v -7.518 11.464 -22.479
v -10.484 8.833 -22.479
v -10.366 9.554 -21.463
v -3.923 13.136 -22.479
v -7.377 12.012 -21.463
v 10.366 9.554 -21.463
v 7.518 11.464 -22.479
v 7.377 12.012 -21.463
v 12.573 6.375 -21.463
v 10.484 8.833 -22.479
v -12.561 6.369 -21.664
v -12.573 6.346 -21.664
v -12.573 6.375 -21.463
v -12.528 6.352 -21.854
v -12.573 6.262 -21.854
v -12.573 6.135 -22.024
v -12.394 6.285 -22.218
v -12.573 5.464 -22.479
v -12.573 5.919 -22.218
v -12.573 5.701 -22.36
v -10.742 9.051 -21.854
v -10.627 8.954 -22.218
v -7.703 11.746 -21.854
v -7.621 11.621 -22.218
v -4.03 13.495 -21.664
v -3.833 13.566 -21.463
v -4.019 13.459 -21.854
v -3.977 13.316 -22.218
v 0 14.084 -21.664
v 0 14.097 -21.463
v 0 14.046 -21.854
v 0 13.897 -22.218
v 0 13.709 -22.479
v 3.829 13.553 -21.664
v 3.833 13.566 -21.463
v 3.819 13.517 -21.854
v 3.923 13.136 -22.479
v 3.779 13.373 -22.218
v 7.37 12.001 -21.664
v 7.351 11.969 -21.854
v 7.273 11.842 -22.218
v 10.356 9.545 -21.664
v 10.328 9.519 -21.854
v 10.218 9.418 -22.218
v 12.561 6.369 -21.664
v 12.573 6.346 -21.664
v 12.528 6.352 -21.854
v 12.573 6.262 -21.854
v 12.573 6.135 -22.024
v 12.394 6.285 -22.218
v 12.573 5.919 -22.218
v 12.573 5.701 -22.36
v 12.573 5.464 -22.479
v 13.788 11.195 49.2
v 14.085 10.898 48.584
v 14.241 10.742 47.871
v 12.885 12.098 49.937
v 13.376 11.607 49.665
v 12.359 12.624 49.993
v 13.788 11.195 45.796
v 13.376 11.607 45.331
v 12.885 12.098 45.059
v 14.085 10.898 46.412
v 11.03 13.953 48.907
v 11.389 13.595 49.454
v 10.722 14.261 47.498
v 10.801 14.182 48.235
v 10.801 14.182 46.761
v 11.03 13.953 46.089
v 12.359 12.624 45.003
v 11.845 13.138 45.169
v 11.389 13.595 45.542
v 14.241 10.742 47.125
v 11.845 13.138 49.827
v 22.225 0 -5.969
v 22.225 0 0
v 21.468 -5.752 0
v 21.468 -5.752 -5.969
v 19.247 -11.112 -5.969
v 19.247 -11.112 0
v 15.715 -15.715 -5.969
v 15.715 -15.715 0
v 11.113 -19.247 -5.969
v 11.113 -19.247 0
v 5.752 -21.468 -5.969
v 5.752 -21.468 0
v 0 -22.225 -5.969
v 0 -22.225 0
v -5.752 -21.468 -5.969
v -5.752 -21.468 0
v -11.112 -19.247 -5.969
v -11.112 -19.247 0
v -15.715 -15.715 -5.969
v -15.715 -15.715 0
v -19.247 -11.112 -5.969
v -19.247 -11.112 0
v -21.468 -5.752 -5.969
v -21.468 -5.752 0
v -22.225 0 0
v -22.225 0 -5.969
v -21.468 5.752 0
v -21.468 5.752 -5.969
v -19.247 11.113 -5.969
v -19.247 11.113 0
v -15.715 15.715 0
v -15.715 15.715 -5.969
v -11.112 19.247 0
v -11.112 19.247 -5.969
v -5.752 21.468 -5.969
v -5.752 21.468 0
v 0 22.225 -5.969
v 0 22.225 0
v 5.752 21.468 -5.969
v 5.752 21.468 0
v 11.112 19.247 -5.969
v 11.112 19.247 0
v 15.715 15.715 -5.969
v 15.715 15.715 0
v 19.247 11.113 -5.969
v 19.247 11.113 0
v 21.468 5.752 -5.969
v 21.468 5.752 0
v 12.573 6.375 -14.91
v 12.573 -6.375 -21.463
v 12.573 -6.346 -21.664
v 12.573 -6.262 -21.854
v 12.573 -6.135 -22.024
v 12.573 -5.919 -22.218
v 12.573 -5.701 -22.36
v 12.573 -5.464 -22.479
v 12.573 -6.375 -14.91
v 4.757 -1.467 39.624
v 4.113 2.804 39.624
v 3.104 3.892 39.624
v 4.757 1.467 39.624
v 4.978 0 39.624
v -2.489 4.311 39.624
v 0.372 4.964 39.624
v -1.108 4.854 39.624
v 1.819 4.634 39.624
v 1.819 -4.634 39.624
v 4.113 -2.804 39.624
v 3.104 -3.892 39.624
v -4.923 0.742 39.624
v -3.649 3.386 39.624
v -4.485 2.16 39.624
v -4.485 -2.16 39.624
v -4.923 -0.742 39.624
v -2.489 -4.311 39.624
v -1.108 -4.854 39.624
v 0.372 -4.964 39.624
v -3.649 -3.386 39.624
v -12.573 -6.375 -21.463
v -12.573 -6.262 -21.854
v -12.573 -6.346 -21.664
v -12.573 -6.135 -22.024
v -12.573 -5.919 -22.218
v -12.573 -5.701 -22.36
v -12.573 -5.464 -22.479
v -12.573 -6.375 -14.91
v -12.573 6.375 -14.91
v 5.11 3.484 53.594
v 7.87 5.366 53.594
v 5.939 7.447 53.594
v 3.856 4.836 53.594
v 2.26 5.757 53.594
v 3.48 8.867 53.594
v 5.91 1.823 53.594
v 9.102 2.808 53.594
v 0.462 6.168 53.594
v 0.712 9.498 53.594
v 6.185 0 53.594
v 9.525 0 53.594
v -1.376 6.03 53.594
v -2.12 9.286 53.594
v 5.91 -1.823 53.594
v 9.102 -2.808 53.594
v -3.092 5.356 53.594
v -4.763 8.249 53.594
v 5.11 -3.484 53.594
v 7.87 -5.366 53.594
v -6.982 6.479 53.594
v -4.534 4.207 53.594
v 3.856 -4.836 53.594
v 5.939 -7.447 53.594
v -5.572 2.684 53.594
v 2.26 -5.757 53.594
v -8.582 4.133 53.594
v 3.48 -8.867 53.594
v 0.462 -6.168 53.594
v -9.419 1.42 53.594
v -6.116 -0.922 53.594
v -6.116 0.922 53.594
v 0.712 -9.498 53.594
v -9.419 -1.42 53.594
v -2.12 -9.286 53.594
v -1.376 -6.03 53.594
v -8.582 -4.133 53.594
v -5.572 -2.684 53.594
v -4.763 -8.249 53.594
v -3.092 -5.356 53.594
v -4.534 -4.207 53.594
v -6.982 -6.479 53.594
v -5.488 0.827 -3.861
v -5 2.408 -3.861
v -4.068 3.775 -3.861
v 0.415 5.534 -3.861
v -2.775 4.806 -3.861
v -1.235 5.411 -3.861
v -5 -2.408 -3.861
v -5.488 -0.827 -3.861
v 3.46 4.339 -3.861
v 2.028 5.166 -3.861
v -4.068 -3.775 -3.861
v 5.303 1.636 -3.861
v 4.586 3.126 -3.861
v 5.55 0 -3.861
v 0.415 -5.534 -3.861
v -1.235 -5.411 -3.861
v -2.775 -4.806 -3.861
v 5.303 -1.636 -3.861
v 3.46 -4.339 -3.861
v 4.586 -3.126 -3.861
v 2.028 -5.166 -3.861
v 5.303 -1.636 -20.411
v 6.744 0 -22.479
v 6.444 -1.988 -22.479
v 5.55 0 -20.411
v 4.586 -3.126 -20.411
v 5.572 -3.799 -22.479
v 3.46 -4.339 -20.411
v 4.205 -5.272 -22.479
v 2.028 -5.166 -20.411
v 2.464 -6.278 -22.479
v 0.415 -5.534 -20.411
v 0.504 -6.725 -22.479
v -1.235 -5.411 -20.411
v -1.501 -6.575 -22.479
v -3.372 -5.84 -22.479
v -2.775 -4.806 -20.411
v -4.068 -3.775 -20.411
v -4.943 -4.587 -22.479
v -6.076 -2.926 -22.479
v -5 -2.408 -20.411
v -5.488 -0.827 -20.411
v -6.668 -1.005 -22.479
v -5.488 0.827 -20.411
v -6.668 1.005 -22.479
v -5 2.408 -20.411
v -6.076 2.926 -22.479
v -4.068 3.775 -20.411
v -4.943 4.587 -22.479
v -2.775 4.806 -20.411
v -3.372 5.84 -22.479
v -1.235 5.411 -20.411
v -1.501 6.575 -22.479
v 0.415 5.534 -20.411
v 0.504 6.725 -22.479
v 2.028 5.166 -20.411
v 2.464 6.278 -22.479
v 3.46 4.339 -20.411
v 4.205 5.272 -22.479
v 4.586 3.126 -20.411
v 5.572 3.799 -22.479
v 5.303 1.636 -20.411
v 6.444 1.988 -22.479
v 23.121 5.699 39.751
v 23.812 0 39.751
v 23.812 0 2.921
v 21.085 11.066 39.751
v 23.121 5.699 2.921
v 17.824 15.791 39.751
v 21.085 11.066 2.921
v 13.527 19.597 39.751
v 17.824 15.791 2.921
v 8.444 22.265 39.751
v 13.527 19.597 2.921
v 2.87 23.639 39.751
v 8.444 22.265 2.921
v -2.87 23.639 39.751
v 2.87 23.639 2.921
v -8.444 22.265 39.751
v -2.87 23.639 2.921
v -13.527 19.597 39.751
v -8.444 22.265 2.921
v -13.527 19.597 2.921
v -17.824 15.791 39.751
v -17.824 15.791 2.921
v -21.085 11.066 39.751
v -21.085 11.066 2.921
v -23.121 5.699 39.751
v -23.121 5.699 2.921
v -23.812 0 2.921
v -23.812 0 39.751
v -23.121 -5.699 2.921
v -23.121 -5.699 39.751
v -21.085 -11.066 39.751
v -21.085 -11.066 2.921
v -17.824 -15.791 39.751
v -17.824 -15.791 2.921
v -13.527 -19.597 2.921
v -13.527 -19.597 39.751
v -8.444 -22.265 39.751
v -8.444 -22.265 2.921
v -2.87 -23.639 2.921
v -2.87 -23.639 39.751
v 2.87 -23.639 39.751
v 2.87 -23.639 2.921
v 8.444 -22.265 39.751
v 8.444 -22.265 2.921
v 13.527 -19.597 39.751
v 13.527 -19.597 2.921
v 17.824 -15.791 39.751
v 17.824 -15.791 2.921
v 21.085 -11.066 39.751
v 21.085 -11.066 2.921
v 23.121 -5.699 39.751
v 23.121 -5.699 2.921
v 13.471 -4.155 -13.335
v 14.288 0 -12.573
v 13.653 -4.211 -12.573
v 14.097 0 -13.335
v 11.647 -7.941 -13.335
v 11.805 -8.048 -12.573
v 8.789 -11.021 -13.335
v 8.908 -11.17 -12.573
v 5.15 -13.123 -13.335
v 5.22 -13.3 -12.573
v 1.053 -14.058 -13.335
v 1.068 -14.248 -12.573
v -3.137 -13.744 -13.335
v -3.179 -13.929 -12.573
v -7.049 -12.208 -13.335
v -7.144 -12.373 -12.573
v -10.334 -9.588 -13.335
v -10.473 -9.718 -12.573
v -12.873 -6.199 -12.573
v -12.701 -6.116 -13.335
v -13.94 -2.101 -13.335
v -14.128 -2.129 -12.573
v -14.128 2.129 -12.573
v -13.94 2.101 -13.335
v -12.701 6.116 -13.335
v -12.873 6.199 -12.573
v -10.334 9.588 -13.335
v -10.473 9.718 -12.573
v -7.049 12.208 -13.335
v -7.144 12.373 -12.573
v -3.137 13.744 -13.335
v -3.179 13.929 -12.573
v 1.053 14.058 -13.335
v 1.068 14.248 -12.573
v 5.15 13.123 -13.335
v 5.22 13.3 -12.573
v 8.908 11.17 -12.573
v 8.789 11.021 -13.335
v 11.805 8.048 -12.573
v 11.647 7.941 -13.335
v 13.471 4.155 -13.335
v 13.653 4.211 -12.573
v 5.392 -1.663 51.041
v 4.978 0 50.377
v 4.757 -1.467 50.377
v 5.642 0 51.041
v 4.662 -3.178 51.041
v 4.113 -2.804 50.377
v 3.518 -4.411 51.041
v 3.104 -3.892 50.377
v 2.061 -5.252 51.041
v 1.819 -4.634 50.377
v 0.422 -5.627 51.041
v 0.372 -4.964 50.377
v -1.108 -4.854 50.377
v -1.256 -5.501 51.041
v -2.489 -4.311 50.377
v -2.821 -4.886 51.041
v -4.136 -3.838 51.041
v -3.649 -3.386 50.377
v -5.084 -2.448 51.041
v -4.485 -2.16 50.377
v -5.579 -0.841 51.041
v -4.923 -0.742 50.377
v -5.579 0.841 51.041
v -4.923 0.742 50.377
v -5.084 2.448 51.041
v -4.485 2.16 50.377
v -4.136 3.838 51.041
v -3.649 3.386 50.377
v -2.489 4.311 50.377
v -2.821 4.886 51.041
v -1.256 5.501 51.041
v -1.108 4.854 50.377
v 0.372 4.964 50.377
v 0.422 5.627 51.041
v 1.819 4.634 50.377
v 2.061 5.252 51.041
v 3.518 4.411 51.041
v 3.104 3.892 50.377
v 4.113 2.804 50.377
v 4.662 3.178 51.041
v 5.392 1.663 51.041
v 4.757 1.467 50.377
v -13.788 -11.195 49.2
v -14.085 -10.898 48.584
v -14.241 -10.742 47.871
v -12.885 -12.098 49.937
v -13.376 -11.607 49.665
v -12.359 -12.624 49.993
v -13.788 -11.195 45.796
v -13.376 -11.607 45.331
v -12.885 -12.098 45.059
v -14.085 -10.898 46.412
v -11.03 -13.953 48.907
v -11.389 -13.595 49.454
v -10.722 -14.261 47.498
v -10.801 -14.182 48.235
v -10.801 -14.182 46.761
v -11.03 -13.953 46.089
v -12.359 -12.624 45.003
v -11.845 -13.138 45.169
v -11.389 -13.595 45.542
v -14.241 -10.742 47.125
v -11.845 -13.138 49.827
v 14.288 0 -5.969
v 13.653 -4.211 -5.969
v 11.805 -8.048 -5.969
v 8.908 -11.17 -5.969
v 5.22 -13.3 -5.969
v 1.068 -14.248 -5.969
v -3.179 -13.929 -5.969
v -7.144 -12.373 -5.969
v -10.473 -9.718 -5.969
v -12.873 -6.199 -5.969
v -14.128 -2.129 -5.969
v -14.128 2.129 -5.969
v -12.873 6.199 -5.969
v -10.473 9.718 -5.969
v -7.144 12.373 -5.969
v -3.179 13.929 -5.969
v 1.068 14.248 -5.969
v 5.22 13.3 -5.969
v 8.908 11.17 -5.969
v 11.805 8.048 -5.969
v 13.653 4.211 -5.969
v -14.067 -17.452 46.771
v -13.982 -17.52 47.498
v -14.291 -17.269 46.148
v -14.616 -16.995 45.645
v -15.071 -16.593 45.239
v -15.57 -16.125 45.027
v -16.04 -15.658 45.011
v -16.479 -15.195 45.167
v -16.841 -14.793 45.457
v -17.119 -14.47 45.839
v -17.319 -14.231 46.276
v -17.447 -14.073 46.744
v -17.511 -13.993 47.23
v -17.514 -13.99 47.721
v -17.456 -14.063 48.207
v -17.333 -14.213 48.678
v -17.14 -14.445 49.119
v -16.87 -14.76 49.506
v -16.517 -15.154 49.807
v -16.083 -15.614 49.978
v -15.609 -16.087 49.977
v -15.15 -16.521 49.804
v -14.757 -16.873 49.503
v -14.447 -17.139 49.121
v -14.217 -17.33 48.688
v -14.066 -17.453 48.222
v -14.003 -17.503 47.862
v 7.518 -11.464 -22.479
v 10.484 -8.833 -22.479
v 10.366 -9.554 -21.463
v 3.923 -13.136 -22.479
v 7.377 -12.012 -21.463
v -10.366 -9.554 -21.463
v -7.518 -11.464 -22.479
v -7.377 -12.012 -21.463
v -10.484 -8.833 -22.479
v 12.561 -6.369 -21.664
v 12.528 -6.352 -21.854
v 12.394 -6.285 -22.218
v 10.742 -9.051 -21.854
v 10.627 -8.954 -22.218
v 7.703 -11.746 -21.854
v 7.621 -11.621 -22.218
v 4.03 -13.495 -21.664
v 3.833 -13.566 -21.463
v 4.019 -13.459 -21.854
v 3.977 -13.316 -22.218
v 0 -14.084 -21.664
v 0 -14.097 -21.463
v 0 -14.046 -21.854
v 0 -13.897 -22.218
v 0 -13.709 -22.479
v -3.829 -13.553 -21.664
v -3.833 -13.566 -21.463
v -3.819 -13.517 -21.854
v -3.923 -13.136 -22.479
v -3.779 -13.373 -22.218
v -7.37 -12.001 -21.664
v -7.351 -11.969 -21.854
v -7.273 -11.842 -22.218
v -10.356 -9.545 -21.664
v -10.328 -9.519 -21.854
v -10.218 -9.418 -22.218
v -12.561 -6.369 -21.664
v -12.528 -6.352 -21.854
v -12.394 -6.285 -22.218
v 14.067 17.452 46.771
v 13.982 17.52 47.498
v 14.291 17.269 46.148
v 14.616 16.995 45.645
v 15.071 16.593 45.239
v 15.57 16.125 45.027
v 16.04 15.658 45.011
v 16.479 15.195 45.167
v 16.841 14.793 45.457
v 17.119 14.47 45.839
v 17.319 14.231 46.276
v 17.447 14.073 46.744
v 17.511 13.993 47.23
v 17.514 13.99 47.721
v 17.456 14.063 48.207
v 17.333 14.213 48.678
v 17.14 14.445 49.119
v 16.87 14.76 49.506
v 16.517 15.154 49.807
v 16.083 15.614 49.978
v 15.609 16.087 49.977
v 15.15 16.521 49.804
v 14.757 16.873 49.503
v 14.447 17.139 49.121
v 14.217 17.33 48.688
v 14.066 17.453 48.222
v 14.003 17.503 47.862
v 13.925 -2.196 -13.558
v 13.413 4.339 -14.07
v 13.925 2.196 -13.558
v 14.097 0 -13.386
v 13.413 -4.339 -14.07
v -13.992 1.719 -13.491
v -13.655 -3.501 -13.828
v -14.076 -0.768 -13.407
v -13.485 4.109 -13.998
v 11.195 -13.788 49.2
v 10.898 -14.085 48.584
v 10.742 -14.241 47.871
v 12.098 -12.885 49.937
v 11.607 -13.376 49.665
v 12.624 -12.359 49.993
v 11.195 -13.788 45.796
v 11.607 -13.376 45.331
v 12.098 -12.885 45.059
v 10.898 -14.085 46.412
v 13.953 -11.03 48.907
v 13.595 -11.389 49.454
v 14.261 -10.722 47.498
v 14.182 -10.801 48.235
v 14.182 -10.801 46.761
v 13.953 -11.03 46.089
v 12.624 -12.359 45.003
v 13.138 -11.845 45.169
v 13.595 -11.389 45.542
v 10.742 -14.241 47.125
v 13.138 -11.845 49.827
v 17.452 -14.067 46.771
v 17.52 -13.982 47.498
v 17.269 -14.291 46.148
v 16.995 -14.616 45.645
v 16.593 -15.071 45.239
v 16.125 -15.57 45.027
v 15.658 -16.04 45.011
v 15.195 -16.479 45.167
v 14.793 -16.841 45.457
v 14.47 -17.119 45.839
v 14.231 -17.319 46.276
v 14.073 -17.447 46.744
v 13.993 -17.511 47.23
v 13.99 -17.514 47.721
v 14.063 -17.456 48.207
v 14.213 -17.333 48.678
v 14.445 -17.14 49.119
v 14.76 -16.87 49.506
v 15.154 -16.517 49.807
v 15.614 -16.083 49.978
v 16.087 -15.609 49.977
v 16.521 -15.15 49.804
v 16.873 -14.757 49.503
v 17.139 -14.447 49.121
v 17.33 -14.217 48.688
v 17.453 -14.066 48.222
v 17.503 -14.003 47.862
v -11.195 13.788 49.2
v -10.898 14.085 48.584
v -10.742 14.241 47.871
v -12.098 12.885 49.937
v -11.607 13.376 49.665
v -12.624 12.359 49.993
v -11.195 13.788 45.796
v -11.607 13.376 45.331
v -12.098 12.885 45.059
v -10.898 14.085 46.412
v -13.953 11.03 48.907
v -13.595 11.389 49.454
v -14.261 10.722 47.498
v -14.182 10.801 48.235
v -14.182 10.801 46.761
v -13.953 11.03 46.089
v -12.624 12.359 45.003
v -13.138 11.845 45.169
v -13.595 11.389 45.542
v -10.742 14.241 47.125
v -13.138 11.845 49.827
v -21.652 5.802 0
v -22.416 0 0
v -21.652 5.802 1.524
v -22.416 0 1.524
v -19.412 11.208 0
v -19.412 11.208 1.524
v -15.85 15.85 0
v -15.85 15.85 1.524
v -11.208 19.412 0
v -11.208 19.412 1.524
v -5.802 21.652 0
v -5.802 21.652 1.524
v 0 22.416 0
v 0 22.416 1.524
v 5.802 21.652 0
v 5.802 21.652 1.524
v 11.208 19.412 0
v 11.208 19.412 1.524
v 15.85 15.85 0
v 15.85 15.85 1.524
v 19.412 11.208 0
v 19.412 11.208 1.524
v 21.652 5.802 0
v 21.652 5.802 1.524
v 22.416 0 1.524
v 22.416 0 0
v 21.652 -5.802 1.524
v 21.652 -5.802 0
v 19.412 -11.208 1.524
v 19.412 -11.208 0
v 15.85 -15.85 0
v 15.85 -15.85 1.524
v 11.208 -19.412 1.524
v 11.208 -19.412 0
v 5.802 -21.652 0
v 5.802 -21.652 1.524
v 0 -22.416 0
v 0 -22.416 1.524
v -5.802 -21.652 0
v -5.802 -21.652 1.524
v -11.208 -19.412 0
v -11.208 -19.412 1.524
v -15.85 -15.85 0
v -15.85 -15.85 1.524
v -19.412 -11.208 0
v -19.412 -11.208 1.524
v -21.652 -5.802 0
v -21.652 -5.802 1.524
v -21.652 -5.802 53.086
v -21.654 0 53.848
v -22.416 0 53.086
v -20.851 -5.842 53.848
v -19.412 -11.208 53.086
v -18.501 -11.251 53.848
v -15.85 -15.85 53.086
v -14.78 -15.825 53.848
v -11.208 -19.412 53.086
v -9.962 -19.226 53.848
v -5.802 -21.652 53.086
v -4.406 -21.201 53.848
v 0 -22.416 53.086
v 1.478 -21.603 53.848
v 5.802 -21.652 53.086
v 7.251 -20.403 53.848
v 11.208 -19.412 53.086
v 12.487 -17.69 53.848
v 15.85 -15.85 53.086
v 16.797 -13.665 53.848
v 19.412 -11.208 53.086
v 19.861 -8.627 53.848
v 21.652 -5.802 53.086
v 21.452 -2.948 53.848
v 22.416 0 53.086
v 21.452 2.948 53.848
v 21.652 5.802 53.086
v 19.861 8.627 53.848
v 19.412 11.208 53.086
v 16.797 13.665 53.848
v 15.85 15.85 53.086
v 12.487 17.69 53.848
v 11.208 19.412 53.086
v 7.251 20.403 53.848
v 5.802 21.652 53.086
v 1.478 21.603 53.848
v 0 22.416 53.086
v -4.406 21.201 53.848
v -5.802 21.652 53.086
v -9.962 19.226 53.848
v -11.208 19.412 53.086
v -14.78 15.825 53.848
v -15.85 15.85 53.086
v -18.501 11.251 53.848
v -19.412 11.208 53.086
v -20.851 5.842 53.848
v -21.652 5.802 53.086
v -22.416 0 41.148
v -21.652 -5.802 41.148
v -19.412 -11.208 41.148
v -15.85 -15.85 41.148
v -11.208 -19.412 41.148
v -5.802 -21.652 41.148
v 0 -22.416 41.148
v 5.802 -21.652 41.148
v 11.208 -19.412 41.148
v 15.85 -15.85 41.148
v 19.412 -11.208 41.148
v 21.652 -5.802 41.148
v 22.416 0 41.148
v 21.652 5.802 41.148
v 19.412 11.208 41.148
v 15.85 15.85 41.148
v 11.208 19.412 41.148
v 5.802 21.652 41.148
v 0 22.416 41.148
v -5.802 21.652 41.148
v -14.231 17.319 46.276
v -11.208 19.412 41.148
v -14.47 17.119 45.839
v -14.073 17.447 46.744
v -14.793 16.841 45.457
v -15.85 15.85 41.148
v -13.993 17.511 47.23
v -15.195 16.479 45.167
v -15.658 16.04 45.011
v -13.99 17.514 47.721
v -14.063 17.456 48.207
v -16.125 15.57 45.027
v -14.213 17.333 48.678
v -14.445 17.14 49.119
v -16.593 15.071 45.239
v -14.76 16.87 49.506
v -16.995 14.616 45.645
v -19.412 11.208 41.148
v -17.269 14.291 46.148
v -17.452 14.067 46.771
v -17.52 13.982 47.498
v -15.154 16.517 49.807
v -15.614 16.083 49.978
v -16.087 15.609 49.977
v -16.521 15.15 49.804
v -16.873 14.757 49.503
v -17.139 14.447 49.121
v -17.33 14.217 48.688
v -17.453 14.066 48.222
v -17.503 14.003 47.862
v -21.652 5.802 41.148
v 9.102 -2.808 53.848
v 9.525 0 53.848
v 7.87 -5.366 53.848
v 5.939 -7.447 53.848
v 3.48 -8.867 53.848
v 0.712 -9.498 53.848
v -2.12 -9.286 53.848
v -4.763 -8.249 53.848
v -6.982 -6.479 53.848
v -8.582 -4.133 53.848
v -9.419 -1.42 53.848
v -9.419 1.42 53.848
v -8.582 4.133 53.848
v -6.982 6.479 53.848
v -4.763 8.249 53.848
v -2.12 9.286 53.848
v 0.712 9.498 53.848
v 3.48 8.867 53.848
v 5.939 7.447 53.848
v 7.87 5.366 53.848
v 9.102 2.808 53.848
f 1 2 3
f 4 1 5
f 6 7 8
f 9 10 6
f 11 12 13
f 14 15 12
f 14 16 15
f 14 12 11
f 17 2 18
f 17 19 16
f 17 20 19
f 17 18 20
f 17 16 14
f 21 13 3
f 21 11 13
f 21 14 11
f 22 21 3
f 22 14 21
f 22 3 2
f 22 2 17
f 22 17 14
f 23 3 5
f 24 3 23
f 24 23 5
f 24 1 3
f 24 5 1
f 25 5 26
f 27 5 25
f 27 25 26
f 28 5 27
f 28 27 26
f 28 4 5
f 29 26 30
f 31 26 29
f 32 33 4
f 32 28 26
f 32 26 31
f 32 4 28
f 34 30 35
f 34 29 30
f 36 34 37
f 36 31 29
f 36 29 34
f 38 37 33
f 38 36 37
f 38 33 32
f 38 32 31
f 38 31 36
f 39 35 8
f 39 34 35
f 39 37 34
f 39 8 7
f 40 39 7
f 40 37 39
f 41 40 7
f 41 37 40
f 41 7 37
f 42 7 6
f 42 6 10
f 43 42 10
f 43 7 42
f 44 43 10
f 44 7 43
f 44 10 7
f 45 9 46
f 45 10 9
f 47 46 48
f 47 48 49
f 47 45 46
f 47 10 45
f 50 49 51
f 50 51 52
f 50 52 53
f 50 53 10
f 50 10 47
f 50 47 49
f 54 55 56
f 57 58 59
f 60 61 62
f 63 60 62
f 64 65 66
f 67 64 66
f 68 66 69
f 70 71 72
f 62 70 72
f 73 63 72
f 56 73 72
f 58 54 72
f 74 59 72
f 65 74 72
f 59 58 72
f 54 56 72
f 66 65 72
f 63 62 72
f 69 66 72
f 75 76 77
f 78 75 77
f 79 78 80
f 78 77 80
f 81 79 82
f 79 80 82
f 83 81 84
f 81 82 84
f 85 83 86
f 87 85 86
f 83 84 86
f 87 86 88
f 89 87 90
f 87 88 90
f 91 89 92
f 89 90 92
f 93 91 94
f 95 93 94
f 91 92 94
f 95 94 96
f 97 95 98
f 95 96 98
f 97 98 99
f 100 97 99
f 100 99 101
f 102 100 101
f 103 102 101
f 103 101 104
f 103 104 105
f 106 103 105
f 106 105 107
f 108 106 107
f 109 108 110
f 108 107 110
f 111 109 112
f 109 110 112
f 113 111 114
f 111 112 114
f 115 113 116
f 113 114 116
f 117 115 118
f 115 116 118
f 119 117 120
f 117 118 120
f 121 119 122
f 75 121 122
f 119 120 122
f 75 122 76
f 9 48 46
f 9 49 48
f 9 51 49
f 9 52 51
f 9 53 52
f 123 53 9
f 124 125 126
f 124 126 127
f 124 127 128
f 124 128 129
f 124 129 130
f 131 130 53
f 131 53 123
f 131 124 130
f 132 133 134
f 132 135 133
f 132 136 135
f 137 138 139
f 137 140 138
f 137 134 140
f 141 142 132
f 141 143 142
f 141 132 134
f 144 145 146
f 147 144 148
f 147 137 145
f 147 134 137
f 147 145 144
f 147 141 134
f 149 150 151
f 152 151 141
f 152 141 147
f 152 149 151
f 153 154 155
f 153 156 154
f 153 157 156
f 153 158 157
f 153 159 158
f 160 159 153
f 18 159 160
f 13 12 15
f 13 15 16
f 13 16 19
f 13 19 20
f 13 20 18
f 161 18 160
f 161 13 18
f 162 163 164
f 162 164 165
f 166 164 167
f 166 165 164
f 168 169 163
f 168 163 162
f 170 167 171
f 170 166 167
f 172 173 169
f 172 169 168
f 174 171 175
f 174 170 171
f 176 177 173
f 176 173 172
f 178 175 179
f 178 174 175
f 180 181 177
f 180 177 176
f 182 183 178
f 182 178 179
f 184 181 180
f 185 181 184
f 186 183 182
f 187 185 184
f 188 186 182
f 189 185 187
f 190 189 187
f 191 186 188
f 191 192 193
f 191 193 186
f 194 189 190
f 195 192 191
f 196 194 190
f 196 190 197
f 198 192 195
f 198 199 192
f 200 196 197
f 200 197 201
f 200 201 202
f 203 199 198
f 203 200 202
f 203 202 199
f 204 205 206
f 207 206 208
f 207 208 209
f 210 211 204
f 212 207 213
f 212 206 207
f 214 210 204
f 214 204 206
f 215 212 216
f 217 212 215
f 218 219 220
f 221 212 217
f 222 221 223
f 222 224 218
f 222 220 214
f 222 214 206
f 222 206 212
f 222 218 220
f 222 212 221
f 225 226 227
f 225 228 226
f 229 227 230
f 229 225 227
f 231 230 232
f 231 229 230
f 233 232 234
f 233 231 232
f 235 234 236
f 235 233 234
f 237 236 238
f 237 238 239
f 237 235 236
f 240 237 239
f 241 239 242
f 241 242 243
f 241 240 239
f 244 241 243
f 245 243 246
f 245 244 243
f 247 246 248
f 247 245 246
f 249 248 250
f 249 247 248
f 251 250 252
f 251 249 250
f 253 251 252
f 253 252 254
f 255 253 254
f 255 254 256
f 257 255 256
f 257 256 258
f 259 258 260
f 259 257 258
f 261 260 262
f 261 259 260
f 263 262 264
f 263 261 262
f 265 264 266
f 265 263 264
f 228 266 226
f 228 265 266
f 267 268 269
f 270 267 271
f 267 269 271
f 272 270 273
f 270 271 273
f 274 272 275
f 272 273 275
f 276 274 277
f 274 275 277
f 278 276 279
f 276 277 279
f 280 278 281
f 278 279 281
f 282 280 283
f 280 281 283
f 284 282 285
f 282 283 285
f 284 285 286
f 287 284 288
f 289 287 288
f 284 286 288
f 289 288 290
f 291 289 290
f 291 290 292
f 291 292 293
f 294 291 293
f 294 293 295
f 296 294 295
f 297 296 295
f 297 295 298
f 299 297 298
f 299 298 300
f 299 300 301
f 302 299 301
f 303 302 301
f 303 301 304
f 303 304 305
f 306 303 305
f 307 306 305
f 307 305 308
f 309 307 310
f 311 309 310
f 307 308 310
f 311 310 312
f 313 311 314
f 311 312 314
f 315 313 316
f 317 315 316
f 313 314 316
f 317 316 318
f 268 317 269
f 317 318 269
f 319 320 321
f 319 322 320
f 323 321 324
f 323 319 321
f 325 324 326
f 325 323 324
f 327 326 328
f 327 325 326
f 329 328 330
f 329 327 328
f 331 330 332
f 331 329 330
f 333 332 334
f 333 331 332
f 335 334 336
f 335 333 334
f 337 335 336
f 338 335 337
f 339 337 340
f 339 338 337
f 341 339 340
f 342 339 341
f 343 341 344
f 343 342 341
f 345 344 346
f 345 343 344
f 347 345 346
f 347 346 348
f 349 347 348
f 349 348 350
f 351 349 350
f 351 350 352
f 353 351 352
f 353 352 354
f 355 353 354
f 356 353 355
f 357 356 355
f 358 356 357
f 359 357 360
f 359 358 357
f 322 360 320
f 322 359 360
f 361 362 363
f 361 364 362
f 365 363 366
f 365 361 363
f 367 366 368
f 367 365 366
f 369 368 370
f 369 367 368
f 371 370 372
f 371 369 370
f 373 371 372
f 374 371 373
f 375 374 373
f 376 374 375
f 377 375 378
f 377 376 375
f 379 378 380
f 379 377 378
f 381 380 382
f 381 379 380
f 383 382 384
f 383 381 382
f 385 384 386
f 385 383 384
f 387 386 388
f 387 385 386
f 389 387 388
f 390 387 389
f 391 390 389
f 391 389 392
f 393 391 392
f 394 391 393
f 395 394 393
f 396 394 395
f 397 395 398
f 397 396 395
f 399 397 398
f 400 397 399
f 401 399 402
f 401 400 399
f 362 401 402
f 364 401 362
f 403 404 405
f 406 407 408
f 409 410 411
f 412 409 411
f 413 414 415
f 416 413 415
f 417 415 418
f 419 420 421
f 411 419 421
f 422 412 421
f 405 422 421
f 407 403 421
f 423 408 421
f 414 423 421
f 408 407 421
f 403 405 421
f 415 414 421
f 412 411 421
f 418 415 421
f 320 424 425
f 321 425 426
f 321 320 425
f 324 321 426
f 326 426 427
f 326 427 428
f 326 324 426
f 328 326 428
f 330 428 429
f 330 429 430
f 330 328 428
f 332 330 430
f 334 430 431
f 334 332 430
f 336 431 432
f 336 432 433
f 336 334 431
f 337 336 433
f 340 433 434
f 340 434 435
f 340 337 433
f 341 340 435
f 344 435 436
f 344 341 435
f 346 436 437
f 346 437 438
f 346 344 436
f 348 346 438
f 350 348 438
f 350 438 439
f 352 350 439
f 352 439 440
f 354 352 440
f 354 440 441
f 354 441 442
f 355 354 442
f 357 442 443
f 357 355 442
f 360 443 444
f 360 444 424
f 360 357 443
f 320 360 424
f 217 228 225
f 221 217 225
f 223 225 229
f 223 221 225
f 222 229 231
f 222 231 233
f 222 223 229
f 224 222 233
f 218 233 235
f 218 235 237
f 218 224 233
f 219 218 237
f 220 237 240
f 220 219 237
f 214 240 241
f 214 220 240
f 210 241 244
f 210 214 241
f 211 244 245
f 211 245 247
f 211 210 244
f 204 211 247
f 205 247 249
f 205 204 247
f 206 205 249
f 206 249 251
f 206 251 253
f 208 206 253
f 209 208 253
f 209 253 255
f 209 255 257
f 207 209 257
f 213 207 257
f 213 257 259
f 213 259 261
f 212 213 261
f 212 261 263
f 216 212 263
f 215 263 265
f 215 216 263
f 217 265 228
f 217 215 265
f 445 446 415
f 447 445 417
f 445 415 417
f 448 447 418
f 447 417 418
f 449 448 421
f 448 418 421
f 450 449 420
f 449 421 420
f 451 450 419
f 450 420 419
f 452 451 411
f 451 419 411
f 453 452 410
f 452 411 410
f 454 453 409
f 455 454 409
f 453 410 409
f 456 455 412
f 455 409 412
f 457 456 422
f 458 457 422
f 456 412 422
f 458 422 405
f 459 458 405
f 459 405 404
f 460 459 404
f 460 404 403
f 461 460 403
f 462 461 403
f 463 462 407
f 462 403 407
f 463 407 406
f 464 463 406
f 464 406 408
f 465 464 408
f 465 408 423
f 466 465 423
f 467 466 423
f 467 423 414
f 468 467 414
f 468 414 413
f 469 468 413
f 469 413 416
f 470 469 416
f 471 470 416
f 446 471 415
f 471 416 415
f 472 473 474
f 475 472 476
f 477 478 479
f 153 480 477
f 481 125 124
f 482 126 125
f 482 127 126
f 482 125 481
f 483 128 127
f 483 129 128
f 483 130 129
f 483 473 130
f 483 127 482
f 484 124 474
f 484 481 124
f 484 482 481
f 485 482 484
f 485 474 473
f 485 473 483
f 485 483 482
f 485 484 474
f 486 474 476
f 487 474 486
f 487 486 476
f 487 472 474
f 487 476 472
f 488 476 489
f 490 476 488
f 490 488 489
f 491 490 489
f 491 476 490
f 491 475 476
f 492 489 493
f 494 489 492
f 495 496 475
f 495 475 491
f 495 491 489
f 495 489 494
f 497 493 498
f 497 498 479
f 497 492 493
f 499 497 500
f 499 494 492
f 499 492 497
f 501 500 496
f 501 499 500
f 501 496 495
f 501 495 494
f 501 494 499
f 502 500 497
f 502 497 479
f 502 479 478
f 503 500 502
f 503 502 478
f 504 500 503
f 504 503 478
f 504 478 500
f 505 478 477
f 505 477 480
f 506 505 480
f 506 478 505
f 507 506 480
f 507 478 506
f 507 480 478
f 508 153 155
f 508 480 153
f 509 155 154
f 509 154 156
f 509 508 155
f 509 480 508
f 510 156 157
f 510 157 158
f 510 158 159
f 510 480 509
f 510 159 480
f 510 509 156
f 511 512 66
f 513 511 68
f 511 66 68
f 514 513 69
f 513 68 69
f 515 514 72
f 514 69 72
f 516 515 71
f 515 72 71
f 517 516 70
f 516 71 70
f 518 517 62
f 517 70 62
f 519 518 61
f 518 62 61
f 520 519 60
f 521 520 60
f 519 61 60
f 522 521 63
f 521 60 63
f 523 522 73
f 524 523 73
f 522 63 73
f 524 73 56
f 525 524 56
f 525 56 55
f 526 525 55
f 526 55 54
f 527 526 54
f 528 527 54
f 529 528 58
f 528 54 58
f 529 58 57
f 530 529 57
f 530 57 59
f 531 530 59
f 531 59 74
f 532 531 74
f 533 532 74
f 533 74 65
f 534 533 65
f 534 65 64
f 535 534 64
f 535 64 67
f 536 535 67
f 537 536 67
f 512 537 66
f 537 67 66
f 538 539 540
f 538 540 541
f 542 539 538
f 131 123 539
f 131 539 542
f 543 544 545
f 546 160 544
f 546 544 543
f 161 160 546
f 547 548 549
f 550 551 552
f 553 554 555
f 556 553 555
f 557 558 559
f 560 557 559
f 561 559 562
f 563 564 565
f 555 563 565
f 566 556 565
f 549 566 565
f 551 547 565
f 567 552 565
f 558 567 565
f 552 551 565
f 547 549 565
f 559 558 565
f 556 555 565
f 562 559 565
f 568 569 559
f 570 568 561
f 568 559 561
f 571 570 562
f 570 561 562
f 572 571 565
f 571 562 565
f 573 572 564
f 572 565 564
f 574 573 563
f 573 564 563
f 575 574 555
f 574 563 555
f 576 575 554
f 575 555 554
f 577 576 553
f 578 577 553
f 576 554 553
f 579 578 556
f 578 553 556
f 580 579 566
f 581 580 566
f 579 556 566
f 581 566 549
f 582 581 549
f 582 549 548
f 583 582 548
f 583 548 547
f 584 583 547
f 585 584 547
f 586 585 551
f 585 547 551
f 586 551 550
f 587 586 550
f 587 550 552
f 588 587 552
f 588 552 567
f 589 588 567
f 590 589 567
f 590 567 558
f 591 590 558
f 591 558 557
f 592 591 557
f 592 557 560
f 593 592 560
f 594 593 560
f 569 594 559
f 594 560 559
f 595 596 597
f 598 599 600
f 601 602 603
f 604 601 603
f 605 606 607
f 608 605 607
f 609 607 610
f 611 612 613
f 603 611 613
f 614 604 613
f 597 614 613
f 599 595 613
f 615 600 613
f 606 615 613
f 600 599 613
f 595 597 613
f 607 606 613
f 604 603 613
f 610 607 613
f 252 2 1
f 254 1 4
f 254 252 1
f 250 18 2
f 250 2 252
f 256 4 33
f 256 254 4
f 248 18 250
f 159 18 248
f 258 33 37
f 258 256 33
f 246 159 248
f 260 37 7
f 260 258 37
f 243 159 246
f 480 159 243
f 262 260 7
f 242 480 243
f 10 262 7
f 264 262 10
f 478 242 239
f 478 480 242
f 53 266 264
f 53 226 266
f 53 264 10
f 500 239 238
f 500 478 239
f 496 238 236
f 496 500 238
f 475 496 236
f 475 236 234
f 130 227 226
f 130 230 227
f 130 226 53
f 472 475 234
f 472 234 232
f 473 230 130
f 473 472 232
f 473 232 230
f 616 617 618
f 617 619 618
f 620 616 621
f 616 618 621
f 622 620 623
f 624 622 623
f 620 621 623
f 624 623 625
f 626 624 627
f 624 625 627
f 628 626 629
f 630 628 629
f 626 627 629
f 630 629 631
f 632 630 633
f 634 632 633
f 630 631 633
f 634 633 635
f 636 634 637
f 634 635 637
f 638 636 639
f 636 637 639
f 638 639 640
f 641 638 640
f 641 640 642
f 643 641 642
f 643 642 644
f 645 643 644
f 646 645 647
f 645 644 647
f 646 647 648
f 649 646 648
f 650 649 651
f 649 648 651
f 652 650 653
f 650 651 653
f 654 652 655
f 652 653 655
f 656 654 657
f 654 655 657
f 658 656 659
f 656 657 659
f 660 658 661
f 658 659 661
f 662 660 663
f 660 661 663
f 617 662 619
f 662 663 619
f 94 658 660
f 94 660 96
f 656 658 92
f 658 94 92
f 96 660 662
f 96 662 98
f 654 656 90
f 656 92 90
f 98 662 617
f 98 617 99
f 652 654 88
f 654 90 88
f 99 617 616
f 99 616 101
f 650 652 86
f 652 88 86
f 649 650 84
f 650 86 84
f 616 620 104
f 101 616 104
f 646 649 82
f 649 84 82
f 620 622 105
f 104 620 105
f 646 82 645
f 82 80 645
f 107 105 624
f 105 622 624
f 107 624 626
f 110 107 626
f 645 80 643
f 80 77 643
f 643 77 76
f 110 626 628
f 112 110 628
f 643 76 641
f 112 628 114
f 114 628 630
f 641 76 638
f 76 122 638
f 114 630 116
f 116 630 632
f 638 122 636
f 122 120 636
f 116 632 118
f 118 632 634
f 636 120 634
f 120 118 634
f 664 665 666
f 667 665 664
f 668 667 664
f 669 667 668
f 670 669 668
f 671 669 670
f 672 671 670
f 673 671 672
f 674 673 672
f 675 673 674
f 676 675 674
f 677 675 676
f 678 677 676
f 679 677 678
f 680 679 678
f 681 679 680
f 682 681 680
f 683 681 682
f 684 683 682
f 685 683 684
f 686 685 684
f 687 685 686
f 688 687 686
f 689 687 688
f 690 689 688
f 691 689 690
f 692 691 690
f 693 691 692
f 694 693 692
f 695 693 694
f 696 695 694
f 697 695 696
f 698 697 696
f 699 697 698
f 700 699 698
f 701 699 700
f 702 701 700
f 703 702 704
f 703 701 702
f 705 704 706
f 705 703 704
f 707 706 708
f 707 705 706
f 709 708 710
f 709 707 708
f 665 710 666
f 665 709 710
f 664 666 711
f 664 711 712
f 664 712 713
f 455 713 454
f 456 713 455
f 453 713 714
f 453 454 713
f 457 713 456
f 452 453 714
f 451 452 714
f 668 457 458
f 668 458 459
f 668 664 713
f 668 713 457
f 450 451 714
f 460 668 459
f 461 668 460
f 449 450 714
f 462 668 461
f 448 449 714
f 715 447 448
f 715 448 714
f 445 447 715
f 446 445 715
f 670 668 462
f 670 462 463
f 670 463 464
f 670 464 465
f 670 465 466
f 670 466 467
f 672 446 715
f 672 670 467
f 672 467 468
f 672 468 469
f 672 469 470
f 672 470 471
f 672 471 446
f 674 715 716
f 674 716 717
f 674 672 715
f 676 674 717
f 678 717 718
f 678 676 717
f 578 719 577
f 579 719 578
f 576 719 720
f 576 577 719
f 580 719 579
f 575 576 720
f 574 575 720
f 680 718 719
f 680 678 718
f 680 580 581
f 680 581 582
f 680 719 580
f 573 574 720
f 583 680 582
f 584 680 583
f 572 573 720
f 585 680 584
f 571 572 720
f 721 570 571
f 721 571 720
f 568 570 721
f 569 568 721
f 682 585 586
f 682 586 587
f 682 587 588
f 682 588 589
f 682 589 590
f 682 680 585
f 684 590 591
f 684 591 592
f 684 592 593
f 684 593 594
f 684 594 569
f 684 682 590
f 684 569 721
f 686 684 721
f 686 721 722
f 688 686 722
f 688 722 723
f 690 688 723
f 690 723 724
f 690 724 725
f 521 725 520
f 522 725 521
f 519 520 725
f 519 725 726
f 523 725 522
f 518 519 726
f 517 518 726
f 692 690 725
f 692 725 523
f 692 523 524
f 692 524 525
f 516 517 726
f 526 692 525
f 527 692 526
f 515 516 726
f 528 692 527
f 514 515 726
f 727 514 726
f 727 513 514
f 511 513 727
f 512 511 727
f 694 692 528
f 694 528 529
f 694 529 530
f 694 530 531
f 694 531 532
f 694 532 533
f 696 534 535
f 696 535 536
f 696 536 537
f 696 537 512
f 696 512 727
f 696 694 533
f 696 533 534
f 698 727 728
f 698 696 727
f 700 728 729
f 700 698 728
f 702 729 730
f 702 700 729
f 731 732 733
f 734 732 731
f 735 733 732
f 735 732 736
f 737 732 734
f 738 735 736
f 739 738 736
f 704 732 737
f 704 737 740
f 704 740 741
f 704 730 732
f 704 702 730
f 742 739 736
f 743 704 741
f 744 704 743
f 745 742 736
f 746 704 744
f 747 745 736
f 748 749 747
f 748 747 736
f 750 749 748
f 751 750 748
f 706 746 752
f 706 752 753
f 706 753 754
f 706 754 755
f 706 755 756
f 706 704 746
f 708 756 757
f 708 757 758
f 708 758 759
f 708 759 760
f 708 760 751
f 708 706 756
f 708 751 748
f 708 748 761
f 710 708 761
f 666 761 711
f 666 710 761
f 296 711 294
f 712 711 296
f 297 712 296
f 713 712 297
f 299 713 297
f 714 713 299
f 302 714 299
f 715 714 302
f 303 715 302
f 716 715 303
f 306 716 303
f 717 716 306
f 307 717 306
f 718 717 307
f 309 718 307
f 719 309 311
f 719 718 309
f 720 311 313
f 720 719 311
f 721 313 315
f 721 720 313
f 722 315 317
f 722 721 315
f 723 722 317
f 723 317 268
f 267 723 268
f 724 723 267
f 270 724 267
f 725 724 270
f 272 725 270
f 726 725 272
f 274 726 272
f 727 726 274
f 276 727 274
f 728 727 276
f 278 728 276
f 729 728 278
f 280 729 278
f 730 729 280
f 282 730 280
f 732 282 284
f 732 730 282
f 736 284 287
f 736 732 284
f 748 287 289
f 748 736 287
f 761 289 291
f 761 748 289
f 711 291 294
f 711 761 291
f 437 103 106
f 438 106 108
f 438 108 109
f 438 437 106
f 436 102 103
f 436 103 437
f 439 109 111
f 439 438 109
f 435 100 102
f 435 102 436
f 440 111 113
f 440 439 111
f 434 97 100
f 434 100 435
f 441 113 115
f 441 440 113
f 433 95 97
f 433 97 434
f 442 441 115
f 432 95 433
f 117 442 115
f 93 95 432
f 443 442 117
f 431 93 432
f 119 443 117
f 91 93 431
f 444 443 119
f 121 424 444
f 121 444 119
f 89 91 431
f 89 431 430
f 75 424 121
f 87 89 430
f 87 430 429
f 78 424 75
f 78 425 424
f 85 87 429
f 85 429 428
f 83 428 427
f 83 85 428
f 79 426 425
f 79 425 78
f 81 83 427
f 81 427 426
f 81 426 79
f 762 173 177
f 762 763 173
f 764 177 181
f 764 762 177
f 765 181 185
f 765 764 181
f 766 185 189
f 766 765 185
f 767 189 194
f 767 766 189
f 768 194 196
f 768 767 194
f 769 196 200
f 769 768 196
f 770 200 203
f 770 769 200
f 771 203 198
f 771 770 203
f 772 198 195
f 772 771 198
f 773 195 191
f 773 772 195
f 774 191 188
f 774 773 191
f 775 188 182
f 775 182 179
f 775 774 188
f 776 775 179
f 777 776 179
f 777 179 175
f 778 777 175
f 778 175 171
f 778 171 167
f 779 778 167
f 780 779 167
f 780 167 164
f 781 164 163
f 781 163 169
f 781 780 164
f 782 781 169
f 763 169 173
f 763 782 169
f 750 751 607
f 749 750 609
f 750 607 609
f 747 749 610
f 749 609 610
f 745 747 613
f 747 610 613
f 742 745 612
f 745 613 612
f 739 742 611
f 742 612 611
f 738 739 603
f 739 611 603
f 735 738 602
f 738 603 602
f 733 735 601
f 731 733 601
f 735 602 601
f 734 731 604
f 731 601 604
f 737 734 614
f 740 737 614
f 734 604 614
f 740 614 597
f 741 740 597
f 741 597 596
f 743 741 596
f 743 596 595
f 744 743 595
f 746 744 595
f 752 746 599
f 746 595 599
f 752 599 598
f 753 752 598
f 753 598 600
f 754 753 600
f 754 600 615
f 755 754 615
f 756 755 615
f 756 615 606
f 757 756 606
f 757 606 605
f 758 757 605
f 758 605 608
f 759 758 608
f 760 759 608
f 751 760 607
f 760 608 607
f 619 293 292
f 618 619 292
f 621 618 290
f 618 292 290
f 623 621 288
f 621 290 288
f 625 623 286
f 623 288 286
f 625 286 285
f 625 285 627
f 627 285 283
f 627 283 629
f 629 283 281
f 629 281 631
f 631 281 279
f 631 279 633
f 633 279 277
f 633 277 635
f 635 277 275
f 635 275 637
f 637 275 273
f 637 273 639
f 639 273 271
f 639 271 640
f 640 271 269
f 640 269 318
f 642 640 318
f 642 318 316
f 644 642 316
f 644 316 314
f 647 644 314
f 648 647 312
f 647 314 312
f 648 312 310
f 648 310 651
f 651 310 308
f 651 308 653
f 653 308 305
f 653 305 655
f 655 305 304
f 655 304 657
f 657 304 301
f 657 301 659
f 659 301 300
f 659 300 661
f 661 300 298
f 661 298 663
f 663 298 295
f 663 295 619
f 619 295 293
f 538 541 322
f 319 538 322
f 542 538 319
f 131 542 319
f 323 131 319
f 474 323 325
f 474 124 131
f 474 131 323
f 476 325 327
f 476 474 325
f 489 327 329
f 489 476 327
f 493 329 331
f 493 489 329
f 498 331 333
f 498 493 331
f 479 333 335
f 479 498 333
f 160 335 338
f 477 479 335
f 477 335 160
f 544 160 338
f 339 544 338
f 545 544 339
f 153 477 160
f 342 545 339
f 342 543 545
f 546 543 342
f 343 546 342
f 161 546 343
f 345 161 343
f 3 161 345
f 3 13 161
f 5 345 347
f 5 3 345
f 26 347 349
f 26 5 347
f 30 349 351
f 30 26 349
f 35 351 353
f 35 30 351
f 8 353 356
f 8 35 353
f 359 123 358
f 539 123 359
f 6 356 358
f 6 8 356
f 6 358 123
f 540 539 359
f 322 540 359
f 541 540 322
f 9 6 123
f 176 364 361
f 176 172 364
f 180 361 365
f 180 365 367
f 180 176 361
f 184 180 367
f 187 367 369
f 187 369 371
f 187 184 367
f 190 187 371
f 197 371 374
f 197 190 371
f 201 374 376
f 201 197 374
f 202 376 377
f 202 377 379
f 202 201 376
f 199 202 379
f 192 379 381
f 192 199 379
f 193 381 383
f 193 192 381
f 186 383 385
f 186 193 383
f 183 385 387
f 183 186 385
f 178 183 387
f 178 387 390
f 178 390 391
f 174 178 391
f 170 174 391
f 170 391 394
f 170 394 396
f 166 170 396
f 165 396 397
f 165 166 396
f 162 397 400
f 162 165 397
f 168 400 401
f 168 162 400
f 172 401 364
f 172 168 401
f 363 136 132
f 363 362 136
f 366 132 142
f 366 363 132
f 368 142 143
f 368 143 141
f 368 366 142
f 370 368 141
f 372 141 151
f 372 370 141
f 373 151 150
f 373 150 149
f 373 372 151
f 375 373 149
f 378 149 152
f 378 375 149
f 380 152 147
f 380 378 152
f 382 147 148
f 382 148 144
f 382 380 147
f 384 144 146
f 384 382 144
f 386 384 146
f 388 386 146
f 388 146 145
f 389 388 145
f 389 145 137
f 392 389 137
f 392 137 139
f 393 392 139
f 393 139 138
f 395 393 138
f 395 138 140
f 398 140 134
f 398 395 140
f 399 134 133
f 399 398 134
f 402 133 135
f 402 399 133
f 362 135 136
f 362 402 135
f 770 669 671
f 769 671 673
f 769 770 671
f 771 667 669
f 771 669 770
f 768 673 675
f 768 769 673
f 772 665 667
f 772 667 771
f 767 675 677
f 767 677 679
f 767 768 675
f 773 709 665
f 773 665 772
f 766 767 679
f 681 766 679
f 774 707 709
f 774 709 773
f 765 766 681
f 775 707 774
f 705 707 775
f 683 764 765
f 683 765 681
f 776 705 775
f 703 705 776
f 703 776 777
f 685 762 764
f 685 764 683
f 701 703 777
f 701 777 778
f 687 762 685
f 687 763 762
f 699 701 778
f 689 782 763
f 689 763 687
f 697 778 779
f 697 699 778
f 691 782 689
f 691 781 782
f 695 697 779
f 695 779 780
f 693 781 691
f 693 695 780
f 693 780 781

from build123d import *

# Parameters (mm, degrees)
SKETCH1_R          = 23.8125
EXTRUDE1_DEPTH     = 53.848
CHAMFER1_SIZE      = 0.762
SKETCH6_R          = 22.225
EXTRUDE2_DEPTH     = 5.969
SKETCH7_W          = 16.51
SKETCH7_H          = 14.2875
CUT_EXTRUDE4_DEPTH = 19.84248
HOLE1_D            = 5.0038
HOLE1_DEPTH        = 4.7498
CIRPATTERN1_COUNT  = 4


with BuildPart() as part:
    # Sketch1 → Extrude1 (new body)
    with BuildSketch(Plane.XY):
        Circle(SKETCH1_R)
    extrude(amount=EXTRUDE1_DEPTH)

    # Sketch2 → Cut-Revolve1 (revolve, cut)
    with BuildSketch(Plane(origin=(0, 0, 0), x_dir=(1, 0, 0), z_dir=(0, 1, 0)), mode=Mode.PRIVATE) as cut_revolve1_sk:
        Polygon((23.8125, -53.848), (23.8125, -39.751), (22.4155, -41.148), (22.4155, -53.848), align=None)
    revolve(cut_revolve1_sk.sketch.rotate(Axis((0, 0, 0), (0, 0, 1)), 180), axis=Axis((0, 0, 0), (0, 0, 1)), mode=Mode.SUBTRACT)  # turned: the seam where the file's is

    # Sketch3 → Cut-Revolve2 (revolve, cut)
    with BuildSketch(Plane(origin=(0, 0, 0), x_dir=(1, 0, 0), z_dir=(0, 1, 0)), mode=Mode.PRIVATE) as cut_revolve2_sk:
        Polygon((22.4155, 0), (22.4155, -1.524), (23.8125, -2.921), (23.8125, 0), align=None)
    revolve(cut_revolve2_sk.sketch.rotate(Axis((0, 0, 0), (0, 0, -1)), 180), axis=Axis((0, 0, 0), (0, 0, -1)), mode=Mode.SUBTRACT)  # turned: the seam where the file's is

    # S2D0002 → Cut-Revolve3 (revolve, cut)
    with BuildSketch(Plane(origin=(0, 0, 0), x_dir=(1, 0, 0), z_dir=(0, 1, 0))):
        Polygon((6.1849, -53.594), (9.525, -53.594), (9.525, -53.848), (0, -53.848), (0, -39.624), (4.9784, -39.624), (4.9784, -50.377393135), (5.642306865, -51.0413), align=None)
    revolve(axis=Axis((0, 0, 14.6685), (0, 0, -1)), mode=Mode.SUBTRACT)

    # Chamfer1
    chamfer1_edges = [part.edges().sort_by_distance(p)[0] for p in [
        (22.4155, 0, 53.848),
    ]]
    chamfer(chamfer1_edges, length=CHAMFER1_SIZE)

    # Sketch6 → Extrude2 (add)
    with BuildSketch(Plane(origin=(0, 0, 0), x_dir=(-1, 0, 0), z_dir=(0, 0, -1))):
        with Locations(Location((0, 0, 0), (0, 0, 180))):  # turned: the seam where the file's is
            Circle(SKETCH6_R)
    extrude(amount=EXTRUDE2_DEPTH)

    # Sketch7 → Revolve1 (revolve)
    with BuildSketch(Plane(origin=(0, 0, 0), x_dir=(0, 0, -1), z_dir=(1, 0, 0)), mode=Mode.PRIVATE) as revolve1_sk:
        with Locations((14.224, -7.14375)):
            Rectangle(SKETCH7_W, SKETCH7_H)
    revolve(revolve1_sk.sketch.rotate(Axis((0, 0, 0), (0, 0, -1)), 270), axis=Axis((0, 0, 0), (0, 0, -1)))  # turned: the seam where the file's is

    # S2D0001 → Cut-Revolve5 (revolve, cut)
    with BuildSketch(Plane(origin=(0, 0, 0), x_dir=(1, 0, 0), z_dir=(0, 1, 0))):
        Polygon((5.5499, 20.411277746), (5.5499, 3.8608), (0, 3.8608), (0, 22.479), (6.7437, 22.479), align=None)
    revolve(axis=Axis((0, 0, 31.308359971), (0, 0, -1)), mode=Mode.SUBTRACT)

    # Sketch9 → Cut-Revolve6 (revolve, cut)
    with BuildSketch(Plane(origin=(0, 0, 0), x_dir=(0, -1, 0), z_dir=(1, 0, 0)), mode=Mode.PRIVATE) as cut_revolve6_sk:
        with BuildLine():
            Line((-14.2875, 12.573), (-14.097, 13.335))
            Line((-14.097, 13.335), (-14.097, 21.463))
            ThreePointArc((-14.097, 21.463), (-13.996678675, 22.006796865), (-13.708922533, 22.479))
            Line((-13.708922533, 22.479), (-14.2875, 22.479))
            Line((-14.2875, 22.479), (-14.2875, 12.573))
        make_face()
    revolve(cut_revolve6_sk.sketch.rotate(Axis((0, 0, -12.65936), (0, 0, -1)), 90), axis=Axis((0, 0, -12.65936), (0, 0, -1)), mode=Mode.SUBTRACT)  # turned: the seam where the file's is

    # Sketch13 → Cut-Extrude4 (cut, symmetric)
    with BuildSketch(Plane(origin=(0, 0, 0), x_dir=(1, 0, 0), z_dir=(0, 1, 0))):
        Polygon((12.573, 22.479), (12.573, 14.9098), (14.2875, 13.1953), (14.2875, 22.479), align=None)
        Polygon((-12.573, 22.479), (-12.573, 14.9098), (-14.2875, 13.1953), (-14.2875, 22.479), align=None)
    extrude(amount=CUT_EXTRUDE4_DEPTH, both=True, mode=Mode.SUBTRACT)

    # Hole1
    with Locations(Plane(origin=(-15.850152054, 15.850152054, 47.498), x_dir=(0.707106781, 0.707106781, 0), z_dir=(-0.707106781, 0.707106781, 0))):
        with Locations((0, 0)):
            hole1 = Hole(HOLE1_D / 2, depth=HOLE1_DEPTH)

    # CirPattern1: Hole1 ×4 about axis
    cirpattern1_axis = Axis((0, 0, 0), (0, 0, 1))
    for i in range(1, CIRPATTERN1_COUNT):
        add(hole1.rotate(cirpattern1_axis, i * 360 / CIRPATTERN1_COUNT), mode=Mode.SUBTRACT)


solid = part.part
